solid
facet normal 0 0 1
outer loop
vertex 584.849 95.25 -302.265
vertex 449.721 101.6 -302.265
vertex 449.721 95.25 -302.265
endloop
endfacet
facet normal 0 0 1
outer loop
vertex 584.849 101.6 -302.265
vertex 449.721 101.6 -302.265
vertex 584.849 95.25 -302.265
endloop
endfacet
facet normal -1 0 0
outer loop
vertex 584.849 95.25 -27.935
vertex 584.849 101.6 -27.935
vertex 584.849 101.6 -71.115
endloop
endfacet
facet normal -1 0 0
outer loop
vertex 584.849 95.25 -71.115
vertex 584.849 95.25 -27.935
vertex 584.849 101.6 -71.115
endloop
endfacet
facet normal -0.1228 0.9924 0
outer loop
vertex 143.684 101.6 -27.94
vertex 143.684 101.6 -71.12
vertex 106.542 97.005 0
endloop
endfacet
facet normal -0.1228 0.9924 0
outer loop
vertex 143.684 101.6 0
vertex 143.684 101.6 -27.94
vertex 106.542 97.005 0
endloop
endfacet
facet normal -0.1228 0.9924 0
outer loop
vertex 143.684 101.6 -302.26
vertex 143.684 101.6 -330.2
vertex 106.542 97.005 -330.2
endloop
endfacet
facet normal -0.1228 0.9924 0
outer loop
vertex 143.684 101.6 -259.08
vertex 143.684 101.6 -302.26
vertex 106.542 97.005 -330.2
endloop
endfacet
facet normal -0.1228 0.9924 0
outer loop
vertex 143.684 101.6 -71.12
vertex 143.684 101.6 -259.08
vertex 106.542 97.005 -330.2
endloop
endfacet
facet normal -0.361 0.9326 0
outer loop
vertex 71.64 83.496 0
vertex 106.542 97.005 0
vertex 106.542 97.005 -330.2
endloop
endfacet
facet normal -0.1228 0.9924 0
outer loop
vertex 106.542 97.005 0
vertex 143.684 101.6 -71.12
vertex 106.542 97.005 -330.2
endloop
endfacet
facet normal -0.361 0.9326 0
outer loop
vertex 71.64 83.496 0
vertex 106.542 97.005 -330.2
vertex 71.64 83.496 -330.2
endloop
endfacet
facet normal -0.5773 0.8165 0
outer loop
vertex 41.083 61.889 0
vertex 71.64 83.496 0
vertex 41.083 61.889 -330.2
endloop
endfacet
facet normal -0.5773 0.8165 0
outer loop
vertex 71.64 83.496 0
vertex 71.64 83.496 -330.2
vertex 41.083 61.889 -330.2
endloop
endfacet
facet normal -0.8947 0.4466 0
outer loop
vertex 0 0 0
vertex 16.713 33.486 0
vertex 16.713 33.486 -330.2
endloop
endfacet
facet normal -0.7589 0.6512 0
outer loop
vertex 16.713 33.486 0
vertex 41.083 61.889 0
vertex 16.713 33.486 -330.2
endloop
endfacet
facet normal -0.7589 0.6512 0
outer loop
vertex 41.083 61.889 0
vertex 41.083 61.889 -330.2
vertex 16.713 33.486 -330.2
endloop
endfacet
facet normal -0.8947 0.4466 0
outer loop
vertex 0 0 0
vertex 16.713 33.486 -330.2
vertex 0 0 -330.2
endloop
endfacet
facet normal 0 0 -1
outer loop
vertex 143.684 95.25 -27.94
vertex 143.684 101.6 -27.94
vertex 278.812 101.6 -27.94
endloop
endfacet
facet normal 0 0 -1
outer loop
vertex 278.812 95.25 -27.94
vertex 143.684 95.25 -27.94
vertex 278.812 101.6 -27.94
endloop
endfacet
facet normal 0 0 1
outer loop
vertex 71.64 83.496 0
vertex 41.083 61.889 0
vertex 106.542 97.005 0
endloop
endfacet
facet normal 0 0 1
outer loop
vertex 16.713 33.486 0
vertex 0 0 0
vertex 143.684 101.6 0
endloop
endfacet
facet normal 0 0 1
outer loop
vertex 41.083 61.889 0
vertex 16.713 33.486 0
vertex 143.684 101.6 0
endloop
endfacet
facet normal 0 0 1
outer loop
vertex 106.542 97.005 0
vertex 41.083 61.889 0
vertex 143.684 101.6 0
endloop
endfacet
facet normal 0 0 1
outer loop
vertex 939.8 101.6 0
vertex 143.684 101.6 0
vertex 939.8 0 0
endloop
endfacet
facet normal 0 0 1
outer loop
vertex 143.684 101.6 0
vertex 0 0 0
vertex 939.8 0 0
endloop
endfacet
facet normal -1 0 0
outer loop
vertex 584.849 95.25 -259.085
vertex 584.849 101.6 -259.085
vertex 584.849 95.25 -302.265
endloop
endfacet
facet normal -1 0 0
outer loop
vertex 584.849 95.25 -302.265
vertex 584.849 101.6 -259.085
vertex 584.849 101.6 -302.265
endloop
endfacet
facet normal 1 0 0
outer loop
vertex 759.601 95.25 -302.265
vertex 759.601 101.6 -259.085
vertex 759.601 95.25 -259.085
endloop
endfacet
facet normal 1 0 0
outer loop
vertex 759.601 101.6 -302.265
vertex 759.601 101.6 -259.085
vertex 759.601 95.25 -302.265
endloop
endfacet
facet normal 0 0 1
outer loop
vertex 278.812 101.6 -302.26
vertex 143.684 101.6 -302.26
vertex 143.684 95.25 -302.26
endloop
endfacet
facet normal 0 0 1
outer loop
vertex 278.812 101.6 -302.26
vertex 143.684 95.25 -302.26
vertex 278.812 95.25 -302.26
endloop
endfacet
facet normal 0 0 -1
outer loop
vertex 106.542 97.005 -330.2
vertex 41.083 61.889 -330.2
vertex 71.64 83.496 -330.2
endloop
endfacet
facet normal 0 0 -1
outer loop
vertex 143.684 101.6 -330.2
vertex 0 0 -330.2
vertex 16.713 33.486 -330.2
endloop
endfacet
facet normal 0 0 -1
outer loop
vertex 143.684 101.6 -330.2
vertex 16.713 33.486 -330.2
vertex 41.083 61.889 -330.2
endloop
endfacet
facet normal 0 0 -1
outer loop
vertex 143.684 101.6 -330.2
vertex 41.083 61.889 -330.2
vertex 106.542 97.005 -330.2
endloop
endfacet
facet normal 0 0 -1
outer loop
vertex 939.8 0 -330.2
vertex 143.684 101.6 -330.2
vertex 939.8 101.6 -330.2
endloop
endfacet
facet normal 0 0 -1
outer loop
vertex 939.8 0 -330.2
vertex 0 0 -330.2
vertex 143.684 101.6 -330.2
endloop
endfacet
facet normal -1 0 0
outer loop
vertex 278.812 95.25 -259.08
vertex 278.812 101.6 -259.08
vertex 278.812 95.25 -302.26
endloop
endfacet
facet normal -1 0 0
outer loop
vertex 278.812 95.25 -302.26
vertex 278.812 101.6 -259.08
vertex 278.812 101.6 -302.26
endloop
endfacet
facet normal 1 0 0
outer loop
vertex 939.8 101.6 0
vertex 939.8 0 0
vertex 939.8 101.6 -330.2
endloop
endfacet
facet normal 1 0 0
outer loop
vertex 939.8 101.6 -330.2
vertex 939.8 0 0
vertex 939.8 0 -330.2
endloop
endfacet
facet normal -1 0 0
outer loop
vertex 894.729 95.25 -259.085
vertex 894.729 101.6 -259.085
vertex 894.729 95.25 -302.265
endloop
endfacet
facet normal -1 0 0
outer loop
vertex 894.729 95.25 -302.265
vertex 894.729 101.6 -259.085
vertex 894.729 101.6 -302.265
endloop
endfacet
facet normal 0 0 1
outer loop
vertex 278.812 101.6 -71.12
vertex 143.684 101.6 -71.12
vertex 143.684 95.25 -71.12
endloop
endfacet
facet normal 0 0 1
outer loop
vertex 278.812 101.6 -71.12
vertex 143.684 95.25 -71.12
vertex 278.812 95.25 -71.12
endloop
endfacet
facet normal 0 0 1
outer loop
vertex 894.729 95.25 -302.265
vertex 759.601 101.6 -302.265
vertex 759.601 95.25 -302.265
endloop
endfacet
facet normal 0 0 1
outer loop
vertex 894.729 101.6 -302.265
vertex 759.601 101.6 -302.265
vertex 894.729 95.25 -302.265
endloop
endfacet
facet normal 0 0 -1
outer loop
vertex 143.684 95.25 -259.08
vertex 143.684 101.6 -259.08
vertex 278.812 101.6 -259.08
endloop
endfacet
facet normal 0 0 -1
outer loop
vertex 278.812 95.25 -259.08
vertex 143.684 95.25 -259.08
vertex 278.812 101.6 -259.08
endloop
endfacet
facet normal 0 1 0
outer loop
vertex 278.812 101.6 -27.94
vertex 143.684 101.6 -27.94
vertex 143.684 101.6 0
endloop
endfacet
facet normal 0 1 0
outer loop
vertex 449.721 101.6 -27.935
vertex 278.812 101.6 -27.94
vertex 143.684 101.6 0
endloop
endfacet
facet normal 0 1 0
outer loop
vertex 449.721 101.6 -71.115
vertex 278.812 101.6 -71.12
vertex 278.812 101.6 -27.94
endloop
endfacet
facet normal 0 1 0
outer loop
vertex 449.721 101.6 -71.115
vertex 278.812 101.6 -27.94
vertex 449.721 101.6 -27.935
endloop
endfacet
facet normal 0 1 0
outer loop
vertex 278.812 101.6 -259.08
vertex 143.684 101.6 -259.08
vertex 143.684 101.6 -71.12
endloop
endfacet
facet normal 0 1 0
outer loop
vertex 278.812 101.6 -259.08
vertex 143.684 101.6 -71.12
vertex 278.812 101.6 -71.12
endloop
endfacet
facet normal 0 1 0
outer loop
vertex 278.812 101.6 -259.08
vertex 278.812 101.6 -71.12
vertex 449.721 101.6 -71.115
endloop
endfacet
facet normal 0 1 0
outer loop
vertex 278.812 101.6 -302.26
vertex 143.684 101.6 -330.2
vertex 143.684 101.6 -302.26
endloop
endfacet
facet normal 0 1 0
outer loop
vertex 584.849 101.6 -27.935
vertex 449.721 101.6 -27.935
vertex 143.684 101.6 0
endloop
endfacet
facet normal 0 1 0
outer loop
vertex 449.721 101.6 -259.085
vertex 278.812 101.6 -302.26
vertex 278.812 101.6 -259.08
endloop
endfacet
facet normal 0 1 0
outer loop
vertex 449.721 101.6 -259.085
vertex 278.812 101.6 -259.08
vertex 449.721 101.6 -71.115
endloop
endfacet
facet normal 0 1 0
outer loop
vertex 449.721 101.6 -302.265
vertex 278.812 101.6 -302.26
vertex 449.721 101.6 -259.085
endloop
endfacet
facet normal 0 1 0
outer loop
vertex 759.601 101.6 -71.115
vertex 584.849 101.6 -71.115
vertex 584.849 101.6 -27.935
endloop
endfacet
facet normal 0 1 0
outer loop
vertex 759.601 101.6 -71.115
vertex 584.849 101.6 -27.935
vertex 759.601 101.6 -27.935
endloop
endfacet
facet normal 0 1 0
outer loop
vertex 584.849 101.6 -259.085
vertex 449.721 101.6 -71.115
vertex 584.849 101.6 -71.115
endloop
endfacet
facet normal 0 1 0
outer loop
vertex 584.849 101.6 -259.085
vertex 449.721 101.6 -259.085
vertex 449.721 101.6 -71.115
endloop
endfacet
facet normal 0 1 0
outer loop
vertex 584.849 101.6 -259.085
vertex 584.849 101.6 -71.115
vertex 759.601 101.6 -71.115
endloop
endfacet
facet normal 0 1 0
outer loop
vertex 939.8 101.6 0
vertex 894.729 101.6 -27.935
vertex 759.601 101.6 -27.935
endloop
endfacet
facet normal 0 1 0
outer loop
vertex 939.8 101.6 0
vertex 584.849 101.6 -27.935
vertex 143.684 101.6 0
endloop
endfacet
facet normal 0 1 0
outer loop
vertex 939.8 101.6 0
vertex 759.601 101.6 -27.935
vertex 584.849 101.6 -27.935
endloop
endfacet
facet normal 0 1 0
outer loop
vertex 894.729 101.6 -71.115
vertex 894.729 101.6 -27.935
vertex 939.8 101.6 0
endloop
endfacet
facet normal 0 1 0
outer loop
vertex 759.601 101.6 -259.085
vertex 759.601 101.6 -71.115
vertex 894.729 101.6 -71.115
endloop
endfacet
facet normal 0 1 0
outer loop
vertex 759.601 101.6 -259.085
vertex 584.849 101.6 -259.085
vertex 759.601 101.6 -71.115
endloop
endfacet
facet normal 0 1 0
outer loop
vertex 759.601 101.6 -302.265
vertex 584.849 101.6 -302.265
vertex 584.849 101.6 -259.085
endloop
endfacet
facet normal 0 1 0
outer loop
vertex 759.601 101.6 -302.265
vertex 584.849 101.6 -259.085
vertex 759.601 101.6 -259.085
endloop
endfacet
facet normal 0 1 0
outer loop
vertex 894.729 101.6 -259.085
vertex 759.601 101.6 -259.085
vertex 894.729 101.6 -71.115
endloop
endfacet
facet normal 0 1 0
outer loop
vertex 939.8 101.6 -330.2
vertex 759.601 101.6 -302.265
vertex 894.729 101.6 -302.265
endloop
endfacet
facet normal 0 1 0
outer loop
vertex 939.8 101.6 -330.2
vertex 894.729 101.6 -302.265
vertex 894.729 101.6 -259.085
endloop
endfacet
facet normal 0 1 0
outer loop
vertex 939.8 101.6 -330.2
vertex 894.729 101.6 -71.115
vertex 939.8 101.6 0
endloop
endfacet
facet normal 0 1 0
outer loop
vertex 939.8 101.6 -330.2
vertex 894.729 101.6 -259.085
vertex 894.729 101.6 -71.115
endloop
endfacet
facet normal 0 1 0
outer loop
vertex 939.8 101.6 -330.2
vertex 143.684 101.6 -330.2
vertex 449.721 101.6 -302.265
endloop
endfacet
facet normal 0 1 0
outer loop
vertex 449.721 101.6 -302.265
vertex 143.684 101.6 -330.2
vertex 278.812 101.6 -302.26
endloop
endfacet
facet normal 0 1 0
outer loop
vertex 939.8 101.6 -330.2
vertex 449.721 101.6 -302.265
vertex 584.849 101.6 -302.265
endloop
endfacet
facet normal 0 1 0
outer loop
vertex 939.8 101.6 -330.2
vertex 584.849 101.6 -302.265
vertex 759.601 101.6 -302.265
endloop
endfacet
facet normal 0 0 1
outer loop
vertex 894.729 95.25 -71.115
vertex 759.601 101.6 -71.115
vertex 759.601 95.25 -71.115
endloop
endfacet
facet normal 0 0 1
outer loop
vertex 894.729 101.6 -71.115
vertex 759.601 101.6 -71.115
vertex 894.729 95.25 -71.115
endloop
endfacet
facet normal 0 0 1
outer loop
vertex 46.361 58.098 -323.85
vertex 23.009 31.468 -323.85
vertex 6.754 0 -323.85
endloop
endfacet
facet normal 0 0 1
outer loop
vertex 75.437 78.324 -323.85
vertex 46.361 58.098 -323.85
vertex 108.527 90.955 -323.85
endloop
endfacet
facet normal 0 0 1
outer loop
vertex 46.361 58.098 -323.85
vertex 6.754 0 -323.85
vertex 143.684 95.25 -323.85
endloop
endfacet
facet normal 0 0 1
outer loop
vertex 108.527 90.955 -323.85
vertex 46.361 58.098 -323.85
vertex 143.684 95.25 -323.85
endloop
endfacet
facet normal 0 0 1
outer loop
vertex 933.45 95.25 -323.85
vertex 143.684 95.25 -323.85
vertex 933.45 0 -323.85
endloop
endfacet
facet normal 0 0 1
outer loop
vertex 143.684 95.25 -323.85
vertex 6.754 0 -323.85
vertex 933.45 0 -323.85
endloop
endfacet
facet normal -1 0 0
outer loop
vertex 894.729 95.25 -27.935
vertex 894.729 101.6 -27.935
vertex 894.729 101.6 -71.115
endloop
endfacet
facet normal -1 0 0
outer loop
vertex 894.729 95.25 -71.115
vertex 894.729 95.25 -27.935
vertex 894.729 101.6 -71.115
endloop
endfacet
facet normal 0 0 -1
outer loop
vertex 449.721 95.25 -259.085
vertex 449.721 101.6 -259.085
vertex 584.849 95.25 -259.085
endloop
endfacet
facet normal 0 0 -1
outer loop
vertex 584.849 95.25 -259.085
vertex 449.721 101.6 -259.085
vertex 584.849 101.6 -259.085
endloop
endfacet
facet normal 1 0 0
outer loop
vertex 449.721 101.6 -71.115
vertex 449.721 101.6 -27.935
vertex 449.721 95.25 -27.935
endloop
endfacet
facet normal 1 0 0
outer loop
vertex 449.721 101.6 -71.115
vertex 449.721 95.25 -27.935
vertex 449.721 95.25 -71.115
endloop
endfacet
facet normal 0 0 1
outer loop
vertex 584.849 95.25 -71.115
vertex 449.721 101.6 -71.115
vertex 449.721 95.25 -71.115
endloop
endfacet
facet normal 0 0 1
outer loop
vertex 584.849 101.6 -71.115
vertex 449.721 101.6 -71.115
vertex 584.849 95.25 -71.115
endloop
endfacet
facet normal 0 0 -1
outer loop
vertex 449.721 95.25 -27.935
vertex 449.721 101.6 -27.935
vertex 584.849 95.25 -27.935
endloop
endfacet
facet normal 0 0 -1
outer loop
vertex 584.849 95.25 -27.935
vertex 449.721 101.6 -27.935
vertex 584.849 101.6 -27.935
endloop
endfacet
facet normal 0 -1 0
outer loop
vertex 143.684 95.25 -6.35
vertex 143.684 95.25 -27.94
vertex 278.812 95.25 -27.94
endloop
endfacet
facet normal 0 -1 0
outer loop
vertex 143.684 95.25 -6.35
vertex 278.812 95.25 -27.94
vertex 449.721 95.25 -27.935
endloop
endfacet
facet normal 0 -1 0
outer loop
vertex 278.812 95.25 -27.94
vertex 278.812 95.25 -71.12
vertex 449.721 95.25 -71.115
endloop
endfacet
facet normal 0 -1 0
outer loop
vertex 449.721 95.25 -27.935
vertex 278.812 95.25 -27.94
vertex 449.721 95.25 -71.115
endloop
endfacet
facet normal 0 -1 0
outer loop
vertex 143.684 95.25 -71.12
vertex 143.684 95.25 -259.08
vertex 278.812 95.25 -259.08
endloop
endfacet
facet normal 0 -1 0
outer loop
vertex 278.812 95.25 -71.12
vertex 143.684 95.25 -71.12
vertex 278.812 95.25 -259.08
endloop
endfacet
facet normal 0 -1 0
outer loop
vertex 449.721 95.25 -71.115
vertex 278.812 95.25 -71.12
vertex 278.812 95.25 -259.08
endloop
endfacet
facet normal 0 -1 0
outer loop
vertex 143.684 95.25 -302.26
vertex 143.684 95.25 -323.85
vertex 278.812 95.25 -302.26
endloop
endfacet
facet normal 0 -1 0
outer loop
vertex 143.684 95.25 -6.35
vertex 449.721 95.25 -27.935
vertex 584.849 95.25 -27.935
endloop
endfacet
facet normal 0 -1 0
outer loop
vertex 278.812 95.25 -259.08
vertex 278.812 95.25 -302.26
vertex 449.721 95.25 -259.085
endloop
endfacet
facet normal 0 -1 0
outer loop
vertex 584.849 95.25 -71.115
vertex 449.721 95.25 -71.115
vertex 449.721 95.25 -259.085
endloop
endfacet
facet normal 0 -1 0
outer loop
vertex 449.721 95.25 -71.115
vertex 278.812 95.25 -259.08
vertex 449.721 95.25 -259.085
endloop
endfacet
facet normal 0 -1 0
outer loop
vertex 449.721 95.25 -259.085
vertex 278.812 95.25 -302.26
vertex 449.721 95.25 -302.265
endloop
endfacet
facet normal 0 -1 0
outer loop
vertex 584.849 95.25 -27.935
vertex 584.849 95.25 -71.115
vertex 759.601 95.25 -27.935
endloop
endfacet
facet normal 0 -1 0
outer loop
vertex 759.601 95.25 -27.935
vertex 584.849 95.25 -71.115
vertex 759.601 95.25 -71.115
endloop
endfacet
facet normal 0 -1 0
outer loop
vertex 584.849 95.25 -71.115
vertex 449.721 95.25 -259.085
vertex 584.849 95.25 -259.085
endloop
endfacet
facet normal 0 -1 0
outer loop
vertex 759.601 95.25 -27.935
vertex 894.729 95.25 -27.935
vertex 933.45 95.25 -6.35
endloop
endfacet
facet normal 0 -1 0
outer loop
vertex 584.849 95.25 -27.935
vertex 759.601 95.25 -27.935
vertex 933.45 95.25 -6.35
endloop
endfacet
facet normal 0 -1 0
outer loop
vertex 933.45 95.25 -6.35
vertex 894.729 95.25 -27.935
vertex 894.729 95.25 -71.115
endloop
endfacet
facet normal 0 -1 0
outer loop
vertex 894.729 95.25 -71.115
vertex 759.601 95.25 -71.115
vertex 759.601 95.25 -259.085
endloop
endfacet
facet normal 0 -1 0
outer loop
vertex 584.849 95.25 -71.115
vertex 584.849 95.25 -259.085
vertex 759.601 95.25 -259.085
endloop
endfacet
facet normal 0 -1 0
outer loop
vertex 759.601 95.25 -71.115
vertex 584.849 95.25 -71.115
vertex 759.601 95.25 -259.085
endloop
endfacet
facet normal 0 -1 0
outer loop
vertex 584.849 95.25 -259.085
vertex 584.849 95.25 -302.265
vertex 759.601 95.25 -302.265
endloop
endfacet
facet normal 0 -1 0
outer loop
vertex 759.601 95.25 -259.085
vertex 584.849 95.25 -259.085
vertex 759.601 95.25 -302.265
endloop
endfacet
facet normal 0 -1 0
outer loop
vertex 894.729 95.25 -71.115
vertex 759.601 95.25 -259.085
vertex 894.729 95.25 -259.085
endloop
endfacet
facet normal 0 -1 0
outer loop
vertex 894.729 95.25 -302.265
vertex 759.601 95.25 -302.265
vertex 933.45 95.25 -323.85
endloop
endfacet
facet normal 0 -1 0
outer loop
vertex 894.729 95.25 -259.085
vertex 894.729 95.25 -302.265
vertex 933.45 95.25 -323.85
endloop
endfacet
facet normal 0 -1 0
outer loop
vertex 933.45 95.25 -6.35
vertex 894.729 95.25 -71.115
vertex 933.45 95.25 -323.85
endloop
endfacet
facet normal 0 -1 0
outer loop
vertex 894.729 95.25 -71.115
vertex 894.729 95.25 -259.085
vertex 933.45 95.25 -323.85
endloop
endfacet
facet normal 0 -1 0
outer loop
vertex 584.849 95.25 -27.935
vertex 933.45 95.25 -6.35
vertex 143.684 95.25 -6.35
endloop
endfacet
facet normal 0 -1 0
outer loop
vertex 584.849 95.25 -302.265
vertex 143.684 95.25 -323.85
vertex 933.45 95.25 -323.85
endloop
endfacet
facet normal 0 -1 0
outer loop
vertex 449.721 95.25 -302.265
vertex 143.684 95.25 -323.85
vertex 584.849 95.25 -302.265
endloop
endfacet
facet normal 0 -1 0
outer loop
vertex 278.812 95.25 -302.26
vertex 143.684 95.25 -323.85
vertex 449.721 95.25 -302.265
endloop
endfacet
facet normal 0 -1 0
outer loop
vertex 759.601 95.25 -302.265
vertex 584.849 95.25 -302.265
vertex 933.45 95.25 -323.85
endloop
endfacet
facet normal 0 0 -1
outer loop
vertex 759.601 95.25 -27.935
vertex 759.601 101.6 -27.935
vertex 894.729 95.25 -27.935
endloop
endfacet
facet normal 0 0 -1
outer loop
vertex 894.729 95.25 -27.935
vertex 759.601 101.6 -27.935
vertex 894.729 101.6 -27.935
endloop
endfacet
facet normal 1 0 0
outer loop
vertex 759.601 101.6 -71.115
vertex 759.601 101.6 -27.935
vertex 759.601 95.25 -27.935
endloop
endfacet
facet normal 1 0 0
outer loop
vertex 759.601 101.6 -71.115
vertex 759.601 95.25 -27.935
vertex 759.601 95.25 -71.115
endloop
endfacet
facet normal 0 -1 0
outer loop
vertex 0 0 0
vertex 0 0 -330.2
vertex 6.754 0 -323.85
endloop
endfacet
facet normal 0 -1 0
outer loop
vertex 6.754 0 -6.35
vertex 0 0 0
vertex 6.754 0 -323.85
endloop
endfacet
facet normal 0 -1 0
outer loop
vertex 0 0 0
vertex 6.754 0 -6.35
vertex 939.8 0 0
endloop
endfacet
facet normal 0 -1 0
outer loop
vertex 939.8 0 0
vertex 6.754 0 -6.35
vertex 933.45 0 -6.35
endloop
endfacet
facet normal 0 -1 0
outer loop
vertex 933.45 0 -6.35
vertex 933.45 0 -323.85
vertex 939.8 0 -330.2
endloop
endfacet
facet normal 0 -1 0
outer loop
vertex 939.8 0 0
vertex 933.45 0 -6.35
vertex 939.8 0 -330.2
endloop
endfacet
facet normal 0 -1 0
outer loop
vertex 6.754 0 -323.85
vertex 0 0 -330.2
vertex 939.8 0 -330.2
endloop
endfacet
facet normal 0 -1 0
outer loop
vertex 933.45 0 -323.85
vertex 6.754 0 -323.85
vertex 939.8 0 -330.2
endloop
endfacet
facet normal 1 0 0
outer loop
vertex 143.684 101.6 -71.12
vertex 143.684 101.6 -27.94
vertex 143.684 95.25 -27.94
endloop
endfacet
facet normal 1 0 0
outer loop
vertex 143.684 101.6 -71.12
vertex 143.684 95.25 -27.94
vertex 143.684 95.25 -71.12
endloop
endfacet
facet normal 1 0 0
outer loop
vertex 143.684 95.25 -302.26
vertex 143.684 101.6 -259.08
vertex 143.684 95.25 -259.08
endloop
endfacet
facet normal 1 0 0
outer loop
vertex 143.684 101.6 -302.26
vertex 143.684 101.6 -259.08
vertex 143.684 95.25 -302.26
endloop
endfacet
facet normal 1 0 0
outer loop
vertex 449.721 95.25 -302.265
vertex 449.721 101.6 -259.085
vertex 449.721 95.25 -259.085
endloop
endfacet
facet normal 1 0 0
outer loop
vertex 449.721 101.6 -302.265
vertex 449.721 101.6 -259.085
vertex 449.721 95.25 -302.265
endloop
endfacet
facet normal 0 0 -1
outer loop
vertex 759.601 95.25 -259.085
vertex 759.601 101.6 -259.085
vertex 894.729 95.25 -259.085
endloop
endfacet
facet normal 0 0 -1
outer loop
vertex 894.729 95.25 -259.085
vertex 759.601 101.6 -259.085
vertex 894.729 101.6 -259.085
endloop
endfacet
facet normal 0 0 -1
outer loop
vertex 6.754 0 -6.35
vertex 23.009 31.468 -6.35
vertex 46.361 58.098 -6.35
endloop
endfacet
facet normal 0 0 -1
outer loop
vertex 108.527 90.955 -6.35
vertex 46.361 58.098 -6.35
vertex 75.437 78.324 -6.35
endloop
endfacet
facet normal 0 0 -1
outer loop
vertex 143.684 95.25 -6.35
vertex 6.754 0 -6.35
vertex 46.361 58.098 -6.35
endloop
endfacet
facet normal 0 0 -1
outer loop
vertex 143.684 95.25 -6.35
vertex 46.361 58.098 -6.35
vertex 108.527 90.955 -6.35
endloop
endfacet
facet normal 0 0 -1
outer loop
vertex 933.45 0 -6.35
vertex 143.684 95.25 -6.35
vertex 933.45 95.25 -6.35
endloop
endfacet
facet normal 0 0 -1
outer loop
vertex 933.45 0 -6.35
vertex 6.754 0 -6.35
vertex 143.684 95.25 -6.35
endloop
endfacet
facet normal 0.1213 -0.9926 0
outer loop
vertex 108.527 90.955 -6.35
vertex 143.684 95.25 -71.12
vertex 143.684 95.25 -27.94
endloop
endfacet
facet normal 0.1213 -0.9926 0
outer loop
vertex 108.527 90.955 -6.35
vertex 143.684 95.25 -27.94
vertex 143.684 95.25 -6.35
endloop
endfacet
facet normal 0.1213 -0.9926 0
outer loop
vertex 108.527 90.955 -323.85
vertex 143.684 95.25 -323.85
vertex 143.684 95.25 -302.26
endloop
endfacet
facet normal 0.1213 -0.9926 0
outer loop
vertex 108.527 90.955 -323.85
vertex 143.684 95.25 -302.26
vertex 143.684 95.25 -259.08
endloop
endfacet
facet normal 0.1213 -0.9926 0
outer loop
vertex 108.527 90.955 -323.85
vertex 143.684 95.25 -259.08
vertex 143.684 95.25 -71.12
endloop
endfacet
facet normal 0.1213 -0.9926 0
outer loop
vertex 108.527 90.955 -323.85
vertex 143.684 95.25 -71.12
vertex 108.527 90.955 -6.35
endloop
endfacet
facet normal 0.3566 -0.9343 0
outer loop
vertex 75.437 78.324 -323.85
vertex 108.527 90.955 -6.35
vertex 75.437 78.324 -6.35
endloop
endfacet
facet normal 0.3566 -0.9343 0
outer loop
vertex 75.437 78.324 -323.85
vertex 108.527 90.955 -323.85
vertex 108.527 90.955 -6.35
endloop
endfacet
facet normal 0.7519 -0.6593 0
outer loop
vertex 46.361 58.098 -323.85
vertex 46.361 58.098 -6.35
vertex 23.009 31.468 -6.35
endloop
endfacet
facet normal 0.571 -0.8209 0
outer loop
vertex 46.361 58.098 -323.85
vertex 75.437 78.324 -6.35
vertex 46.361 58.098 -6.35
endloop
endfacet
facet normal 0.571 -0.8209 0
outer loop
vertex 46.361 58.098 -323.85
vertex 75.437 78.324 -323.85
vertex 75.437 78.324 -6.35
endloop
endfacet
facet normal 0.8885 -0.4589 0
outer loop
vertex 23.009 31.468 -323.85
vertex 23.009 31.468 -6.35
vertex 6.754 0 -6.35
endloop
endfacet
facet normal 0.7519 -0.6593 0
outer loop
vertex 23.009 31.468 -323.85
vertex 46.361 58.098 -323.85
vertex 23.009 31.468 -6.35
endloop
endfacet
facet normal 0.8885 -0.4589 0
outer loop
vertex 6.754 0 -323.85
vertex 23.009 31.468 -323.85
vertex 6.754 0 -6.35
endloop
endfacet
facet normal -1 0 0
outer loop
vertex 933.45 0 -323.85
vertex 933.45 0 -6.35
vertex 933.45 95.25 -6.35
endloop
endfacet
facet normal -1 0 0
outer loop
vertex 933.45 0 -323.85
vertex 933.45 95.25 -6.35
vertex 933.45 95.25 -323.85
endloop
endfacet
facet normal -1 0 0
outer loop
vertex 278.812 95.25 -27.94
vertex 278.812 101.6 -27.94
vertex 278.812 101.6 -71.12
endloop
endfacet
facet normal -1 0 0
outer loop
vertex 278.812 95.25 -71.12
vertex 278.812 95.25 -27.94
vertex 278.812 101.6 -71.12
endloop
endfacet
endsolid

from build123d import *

# Parameters (mm, degrees)
SKETCH1_W           = 939.8
SKETCH1_H           = 330.2
BOSS_EXTRUDE1_DEPTH = 101.6
FILLET1_R           = 152.4
SHELL1_T            = -6.35
SKETCH3_W           = 135.128
SKETCH3_H           = 43.18
CUT_EXTRUDE1_DEPTH  = 127.762


with BuildPart() as part:
    # Sketch1 → Boss-Extrude1 (new body)
    with BuildSketch(Plane(origin=(0, 0, 0), x_dir=(1, 0, 0), z_dir=(0, 1, 0))):
        with Locations((469.9, 165.1)):
            Rectangle(SKETCH1_W, SKETCH1_H)
    extrude(amount=BOSS_EXTRUDE1_DEPTH)

    # Fillet1
    # the kernel refuses this fillet: 152.4 mm, written as the material it takes off along each edge
    with BuildSketch(Plane(origin=(0, 101.6, -689.410244843), x_dir=(0, -1, 0), z_dir=(0, 0, 1))) as fillet1_piece_1:
        with BuildLine():
            CenterArc((152.4, 143.684097937), FILLET1_R, 180, 70.528779366)
            Line((0, 143.684097937), (-3.048, 143.684097937))
            Line((-3.048, 143.684097937), (-3.048, 0))
            Line((-3.048, 0), (0, -3.048))
            ThreePointArc((0, -3.048), (50.8, -3.048), (100.584, -2.873681959))
            Line((100.584, -2.873681959), (101.6, 0))
        make_face()
    extrude(amount=1048.620489686, mode=Mode.SUBTRACT)

    # Shell1
    shell1_openings = [part.faces().sort_by_distance(p)[0] for p in [
        (469.9, 0, -165.1),
    ]]
    offset(amount=SHELL1_T, openings=shell1_openings, kind=Kind.INTERSECTION)

    # Sketch3 → Cut-Extrude1 (cut)
    with BuildSketch(Plane(origin=(0, 101.6, 0), x_dir=(1, 0, 0), z_dir=(0, 1, 0))):
        with Locations((517.285069024, 49.525)):
            Rectangle(SKETCH3_W, SKETCH3_H)
        with Locations((827.165069024, 280.675)):
            Rectangle(SKETCH3_W, SKETCH3_H)
        with Locations((827.165069024, 49.525)):
            Rectangle(SKETCH3_W, SKETCH3_H)
        with Locations((517.285069024, 280.675)):
            Rectangle(SKETCH3_W, SKETCH3_H)
        with Locations((211.248097937, 280.67)):
            Rectangle(SKETCH3_W, SKETCH3_H)
        with Locations((211.248097937, 49.53)):
            Rectangle(SKETCH3_W, SKETCH3_H)
    extrude(amount=-CUT_EXTRUDE1_DEPTH, mode=Mode.SUBTRACT)


solid = part.part
